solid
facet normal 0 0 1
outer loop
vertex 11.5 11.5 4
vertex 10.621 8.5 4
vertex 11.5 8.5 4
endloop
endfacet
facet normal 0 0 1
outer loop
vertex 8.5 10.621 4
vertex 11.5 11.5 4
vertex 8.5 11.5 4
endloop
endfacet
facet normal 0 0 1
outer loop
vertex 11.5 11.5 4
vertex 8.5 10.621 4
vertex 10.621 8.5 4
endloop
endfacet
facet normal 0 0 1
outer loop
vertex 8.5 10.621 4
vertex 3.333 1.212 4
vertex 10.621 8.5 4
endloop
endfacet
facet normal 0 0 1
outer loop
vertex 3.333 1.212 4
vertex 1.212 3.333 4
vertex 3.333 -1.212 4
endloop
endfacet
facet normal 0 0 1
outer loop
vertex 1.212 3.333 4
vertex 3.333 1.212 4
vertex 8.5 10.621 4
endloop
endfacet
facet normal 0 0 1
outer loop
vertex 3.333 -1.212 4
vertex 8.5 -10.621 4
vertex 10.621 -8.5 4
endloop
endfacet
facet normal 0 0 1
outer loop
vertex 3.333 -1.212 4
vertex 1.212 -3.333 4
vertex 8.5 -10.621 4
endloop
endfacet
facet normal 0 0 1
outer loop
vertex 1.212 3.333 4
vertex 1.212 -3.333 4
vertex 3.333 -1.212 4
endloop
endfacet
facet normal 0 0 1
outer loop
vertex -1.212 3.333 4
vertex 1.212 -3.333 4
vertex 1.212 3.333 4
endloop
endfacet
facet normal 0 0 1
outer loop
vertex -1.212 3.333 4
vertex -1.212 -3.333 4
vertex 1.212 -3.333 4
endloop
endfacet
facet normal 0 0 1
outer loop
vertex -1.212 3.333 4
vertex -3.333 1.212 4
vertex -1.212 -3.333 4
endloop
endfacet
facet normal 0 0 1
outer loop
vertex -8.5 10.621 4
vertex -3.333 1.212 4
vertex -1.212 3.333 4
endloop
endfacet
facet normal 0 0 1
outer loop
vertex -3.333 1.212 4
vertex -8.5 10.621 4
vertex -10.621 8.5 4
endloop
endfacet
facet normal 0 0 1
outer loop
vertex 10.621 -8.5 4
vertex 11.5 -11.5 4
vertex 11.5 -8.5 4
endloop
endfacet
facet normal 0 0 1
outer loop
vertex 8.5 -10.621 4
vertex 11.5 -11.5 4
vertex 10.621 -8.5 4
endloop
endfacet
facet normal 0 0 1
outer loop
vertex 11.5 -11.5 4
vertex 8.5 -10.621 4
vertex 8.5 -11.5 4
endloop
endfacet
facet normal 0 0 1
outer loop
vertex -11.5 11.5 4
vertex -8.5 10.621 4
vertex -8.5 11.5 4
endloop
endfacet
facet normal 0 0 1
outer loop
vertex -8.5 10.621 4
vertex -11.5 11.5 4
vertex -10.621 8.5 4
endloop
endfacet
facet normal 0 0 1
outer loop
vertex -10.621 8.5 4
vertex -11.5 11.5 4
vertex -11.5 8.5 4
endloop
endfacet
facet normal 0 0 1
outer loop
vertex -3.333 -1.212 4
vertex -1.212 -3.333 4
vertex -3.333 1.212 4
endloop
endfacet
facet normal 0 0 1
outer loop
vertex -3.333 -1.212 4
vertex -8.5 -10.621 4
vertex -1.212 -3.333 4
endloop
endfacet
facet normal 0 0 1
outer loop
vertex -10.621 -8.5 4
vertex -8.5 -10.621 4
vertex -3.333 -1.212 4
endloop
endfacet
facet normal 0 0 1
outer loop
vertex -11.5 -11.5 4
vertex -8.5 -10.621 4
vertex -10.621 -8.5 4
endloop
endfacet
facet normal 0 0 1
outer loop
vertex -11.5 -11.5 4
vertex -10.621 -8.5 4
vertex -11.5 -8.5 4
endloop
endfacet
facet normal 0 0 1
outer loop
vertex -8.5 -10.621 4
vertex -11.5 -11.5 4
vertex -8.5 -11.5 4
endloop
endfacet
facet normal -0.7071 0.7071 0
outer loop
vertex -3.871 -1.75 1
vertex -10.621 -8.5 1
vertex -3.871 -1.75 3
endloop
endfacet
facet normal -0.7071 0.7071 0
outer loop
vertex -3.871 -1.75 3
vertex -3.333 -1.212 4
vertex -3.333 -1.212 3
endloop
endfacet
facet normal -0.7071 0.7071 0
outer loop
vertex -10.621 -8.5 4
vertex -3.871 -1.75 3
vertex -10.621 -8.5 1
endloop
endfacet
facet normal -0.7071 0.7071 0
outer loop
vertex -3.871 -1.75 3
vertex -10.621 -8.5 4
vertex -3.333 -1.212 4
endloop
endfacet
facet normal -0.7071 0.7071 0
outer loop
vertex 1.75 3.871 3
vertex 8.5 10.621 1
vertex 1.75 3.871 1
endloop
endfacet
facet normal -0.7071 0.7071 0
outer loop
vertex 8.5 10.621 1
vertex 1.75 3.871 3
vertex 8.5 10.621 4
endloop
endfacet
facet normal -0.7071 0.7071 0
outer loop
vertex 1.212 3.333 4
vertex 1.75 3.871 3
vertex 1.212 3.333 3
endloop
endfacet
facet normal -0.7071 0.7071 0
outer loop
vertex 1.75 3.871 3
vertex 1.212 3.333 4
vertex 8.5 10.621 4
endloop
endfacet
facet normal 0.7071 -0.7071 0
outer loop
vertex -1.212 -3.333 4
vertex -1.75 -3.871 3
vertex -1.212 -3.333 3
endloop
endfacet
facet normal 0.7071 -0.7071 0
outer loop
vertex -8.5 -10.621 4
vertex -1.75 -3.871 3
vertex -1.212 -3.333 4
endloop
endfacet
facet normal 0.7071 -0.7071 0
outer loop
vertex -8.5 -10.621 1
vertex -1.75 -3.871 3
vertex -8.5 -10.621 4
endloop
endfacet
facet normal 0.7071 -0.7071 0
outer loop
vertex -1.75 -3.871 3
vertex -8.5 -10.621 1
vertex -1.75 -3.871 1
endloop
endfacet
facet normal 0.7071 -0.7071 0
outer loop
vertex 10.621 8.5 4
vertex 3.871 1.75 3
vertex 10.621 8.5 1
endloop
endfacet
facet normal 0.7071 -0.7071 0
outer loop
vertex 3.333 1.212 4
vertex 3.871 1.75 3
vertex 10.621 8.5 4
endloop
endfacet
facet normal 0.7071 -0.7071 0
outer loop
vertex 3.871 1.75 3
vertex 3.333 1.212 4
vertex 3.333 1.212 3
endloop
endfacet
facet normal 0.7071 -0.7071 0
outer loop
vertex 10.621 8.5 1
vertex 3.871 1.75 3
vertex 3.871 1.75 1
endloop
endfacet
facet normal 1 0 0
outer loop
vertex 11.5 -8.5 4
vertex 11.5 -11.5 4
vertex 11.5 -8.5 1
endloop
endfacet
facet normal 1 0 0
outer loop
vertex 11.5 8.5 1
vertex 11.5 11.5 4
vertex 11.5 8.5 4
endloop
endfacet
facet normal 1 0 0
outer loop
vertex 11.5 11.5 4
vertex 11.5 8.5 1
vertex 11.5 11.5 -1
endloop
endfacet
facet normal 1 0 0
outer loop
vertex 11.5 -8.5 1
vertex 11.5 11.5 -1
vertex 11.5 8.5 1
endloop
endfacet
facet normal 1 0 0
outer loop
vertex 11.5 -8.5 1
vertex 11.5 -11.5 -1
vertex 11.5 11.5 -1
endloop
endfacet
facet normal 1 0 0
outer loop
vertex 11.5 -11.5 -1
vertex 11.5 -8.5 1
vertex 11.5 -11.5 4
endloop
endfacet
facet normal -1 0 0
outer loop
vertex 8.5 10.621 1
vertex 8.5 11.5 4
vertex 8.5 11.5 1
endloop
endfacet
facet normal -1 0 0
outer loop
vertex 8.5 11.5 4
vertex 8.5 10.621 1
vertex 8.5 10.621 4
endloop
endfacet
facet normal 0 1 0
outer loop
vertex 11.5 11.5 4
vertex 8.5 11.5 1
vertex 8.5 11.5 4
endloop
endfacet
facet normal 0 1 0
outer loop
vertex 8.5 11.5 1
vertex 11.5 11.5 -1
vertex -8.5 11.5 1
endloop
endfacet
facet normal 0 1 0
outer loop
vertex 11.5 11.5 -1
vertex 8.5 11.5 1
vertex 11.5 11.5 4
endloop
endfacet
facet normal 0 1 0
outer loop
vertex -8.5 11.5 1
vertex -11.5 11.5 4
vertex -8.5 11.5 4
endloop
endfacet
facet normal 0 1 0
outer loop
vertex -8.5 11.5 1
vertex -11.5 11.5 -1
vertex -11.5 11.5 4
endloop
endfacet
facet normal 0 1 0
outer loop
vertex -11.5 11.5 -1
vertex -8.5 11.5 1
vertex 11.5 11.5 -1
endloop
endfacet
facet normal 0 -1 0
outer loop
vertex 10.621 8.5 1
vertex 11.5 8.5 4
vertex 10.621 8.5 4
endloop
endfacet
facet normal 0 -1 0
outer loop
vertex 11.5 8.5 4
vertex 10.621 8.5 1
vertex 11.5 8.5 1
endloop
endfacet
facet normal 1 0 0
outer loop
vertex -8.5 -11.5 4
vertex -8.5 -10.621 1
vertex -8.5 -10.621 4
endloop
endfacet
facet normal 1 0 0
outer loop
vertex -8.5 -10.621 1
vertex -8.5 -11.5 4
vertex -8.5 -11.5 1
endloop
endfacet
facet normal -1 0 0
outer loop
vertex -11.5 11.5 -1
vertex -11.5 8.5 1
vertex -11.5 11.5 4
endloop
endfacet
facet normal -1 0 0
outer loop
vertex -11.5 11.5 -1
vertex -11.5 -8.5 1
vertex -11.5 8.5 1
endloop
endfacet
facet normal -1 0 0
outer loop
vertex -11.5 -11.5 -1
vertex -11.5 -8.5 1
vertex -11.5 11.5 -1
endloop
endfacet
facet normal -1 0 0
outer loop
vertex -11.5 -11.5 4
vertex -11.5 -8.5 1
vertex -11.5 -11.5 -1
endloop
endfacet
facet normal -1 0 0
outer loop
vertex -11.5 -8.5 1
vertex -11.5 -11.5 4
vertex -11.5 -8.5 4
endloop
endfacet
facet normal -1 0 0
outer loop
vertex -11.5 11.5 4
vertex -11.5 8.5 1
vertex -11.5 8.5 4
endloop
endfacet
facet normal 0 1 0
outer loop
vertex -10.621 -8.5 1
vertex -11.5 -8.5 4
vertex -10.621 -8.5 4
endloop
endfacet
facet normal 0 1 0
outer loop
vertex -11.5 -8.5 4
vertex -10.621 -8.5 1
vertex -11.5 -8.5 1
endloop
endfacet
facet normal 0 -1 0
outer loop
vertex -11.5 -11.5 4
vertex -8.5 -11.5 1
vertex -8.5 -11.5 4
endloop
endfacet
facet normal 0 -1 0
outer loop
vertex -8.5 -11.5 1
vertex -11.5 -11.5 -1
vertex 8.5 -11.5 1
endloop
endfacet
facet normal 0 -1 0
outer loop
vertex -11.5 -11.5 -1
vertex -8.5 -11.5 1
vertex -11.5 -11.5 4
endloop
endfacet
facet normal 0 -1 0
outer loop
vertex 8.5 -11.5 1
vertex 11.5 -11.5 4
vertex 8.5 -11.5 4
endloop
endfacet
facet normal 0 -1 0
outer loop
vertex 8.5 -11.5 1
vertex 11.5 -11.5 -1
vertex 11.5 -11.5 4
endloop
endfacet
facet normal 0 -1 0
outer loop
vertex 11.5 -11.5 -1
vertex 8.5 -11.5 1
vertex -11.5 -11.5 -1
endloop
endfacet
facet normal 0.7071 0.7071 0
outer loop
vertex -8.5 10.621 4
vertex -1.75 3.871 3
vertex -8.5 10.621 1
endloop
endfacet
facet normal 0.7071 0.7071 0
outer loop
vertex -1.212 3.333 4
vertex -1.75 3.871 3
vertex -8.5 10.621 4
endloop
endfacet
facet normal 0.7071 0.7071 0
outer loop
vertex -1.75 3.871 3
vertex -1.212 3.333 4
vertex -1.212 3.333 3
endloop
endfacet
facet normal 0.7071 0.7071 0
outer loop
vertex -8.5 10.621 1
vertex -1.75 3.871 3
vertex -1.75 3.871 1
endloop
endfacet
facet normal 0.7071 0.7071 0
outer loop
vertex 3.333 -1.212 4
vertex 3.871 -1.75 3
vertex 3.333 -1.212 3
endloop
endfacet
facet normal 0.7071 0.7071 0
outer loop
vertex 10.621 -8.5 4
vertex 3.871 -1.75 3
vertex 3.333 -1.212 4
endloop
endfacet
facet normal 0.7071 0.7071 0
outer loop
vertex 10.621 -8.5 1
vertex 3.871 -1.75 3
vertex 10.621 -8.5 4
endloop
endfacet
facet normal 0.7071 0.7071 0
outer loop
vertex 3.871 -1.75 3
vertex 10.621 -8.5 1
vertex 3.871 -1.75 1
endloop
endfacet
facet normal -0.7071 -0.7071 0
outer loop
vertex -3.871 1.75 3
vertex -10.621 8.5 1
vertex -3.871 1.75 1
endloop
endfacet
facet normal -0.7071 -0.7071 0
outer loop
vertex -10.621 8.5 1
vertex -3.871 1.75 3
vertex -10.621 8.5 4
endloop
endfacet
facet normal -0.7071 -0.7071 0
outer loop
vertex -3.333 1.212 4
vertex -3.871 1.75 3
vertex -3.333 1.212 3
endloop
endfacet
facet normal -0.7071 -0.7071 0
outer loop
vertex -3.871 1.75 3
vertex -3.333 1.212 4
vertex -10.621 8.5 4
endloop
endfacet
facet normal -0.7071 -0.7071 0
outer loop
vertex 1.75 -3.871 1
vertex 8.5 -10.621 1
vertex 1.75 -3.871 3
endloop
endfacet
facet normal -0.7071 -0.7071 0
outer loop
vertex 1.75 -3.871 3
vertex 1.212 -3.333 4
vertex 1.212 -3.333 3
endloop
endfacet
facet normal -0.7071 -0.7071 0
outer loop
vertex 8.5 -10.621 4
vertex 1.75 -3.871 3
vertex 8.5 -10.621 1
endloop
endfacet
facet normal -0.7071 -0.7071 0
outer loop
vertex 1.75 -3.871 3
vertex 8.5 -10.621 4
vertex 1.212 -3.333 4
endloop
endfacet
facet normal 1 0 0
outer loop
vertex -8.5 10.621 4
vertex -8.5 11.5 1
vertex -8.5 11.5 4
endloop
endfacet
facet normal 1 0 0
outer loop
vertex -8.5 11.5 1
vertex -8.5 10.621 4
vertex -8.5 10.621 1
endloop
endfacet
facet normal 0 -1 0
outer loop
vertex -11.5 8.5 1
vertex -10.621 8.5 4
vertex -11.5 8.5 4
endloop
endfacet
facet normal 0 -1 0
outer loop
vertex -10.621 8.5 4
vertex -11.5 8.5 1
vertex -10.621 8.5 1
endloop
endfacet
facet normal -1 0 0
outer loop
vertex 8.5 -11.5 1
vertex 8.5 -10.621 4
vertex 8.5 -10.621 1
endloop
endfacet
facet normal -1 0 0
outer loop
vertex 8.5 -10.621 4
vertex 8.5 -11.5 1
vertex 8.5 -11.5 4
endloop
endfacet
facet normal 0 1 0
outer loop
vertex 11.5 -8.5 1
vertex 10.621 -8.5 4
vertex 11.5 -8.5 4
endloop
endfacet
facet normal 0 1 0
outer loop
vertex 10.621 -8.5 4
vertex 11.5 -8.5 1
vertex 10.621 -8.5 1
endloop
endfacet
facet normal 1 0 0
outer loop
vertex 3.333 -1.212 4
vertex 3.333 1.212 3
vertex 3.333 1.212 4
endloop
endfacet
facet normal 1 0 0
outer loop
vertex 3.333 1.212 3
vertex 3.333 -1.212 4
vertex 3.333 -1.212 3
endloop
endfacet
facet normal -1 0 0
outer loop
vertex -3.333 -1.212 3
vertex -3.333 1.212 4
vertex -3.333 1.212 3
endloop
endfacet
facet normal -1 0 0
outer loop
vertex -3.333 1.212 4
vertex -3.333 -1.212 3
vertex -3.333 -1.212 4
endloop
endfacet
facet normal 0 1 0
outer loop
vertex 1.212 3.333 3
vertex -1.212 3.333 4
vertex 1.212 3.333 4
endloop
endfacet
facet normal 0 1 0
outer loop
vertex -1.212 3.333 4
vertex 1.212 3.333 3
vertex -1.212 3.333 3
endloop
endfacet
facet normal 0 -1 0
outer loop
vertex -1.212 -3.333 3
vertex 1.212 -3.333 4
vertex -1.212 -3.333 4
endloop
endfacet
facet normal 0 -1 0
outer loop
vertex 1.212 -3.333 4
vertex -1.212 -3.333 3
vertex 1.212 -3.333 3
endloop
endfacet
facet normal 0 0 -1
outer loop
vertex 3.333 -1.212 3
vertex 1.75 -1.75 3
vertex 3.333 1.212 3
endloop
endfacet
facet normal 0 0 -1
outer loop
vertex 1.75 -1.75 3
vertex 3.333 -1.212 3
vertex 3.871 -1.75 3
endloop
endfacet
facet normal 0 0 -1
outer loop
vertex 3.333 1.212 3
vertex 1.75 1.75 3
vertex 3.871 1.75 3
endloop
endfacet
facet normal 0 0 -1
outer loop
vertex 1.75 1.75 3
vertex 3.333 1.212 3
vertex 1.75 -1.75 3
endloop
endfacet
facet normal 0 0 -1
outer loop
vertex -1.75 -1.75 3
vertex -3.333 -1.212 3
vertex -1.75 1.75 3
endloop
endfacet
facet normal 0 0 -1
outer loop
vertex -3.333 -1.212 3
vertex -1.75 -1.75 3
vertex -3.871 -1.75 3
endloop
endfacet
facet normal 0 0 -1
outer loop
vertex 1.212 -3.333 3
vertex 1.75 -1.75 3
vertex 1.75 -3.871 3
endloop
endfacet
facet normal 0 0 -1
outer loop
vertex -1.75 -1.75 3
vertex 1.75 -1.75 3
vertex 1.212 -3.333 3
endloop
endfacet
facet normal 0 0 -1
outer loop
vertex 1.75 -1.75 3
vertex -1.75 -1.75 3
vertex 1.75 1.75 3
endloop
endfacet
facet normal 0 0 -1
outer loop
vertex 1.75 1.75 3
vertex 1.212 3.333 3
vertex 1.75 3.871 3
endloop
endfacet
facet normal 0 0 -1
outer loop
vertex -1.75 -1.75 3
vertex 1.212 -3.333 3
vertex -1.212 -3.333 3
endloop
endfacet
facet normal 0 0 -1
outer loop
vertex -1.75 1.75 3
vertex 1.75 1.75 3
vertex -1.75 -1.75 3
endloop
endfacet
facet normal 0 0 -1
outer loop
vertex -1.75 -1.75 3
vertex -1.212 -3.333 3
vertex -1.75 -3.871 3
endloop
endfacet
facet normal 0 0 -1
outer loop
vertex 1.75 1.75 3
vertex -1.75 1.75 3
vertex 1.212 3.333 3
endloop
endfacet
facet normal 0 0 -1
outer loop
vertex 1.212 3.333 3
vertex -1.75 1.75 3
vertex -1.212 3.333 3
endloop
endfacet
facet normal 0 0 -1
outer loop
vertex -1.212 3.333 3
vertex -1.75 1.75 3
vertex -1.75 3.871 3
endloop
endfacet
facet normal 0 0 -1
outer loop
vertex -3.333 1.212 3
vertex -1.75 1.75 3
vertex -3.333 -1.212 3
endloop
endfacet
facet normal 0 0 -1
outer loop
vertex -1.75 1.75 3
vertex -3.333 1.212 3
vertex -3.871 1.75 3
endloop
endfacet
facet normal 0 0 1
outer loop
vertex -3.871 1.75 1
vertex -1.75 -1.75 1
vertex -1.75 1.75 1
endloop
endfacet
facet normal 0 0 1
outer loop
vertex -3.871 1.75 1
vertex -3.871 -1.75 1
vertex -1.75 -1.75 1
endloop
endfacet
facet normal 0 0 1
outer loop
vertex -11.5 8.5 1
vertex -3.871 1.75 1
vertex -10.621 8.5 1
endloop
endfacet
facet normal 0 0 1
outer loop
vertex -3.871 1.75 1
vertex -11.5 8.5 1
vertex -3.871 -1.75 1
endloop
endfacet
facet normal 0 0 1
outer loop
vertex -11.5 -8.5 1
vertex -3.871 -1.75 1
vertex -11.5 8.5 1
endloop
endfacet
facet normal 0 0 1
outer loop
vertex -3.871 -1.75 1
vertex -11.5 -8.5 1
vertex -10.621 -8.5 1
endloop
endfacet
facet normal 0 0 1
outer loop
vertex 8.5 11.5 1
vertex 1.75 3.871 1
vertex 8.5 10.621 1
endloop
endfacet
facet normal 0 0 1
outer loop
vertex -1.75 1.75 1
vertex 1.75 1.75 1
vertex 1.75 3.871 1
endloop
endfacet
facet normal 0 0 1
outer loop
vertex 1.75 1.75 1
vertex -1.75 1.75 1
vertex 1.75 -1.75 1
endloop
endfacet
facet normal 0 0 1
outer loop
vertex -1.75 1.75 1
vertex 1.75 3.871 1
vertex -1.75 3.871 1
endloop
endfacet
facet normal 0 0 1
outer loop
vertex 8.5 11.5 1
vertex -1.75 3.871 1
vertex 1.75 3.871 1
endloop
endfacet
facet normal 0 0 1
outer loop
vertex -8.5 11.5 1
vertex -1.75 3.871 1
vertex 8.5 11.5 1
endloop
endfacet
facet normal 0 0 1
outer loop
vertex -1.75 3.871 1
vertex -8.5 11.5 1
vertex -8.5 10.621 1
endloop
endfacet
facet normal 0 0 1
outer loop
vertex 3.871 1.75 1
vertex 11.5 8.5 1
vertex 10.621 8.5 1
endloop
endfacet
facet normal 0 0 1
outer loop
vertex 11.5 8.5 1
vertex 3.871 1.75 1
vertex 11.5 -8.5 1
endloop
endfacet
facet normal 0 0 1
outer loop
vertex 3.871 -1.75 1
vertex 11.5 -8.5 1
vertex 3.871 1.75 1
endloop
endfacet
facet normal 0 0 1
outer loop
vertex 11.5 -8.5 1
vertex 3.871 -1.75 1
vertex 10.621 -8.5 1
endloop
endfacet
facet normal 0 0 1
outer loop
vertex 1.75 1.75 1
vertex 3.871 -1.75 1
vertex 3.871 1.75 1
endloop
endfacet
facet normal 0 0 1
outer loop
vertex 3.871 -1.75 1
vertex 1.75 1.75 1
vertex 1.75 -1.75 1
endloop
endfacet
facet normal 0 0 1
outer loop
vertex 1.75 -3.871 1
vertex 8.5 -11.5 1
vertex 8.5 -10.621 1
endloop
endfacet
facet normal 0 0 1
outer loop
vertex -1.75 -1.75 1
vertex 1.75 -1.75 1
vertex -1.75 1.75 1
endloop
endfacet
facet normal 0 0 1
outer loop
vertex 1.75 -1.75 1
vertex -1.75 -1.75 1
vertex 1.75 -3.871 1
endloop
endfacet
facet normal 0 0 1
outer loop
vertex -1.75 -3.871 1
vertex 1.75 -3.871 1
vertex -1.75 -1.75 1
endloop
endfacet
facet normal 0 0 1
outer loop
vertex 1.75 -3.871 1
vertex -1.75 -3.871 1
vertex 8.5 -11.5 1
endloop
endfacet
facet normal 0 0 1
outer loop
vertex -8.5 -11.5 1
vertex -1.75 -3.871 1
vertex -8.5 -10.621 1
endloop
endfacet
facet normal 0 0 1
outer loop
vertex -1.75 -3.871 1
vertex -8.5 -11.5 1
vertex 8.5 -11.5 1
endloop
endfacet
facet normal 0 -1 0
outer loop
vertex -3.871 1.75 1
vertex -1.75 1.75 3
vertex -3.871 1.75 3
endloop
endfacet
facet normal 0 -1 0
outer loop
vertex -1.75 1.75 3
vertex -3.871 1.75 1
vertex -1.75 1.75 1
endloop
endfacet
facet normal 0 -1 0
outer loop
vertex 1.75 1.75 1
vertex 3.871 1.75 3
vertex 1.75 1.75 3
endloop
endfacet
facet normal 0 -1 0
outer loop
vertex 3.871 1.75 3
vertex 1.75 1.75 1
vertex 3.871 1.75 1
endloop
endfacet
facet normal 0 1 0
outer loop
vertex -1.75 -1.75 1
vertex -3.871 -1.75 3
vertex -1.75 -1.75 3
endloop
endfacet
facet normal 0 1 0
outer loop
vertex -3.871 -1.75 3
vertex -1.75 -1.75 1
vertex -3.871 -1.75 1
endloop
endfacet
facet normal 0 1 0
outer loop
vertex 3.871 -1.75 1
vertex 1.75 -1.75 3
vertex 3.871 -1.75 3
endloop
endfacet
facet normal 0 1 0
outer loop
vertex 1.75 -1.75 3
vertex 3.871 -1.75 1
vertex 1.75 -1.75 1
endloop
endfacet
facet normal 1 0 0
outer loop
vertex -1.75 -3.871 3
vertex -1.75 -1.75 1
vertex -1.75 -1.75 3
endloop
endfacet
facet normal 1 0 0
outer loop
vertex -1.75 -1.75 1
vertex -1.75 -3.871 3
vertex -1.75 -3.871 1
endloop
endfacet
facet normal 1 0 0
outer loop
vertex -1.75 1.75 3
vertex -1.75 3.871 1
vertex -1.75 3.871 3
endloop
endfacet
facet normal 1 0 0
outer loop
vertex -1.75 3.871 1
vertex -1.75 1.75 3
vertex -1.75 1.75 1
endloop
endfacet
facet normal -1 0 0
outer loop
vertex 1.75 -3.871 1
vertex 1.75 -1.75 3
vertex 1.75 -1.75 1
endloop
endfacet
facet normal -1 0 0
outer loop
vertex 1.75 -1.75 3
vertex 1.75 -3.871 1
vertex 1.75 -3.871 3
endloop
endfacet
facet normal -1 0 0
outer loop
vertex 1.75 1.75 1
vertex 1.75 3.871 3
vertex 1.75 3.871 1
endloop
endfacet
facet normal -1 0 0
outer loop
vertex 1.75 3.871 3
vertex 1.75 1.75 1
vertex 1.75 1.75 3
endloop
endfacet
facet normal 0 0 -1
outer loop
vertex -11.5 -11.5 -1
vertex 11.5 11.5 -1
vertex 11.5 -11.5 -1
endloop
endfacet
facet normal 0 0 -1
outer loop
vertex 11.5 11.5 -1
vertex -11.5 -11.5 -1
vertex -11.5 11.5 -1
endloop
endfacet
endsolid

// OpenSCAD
// GOAL: Design a parameterized zip tie anchor to be used for cable management
$fn = 128;
DEBUG_ENABLED = false;

// FEATURES:
//  1) Print with no supports (maintain <45 degree angles, or short bridges)
//  2) Standard zipties need to fit
//  3) PLA should be strong enough without having to use ABS or PETG (though I can default to that if need be)
//  4) Should take as parameters the "configuration" items, but default in the case where they are not provided or are zero
//  5) 


// CONFIGURATION NEEDS:
//  1) length/width/base height 
zip_tie_anchor_length           = 20;
zip_tie_anchor_width            = 20;
zip_tie_anchor_base_height      = 2;
zip_tie_anchor_base_edge_radius = 1;

//  2) height/width/gap of anchor "Cross" (Length is durived from base)
zip_tie_cross_height            = 4;
zip_tie_cross_width             = 3;
zip_tie_cross_gap_length        = 5;


zip_tie_anchor();

module zip_tie_anchor(length = 0 ,width = 0 ,base_height = 0 ,base_edge_radius = 0 ,cross_height = 0,cross_width = 0 ,cross_gap_length = 0 )
{
    // If the provided parameters are not present use the defaults
    l_zip_tie_anchor_length             = ( length == 0 ) ? zip_tie_anchor_length : length;
    l_zip_tie_anchor_width              = ( width == 0 ) ? zip_tie_anchor_width : width;
    l_zip_tie_anchor_base_height        = ( base_height == 0 ) ? zip_tie_anchor_base_height : base_height;
    l_zip_tie_anchor_base_edge_radius   = ( base_edge_radius == 0 ) ? zip_tie_anchor_base_edge_radius : base_edge_radius;
    l_zip_tie_cross_height              = ( cross_height == 0 ) ? zip_tie_cross_height : cross_height;
    l_zip_tie_cross_width               = ( cross_width == 0 ) ? zip_tie_cross_width : cross_width;
    l_zip_tie_cross_length              = sqrt(pow(l_zip_tie_anchor_length,2)+pow(l_zip_tie_anchor_width,2))-l_zip_tie_anchor_base_edge_radius+l_zip_tie_cross_width/2;

    // Output the config used for this ZTA if requested
    if ( DEBUG_ENABLED )
    {
        echo ( l_zip_tie_anchor_length                  = l_zip_tie_anchor_length );
        echo ( l_zip_tie_anchor_width                   = l_zip_tie_anchor_width );
        echo ( l_zip_tie_anchor_base_height             = l_zip_tie_anchor_base_height );
        echo ( l_zip_tie_cross_height                   = l_zip_tie_cross_height );
        echo ( l_zip_tie_cross_width                    = l_zip_tie_cross_width );
    }
    
    // Base
    cube([l_zip_tie_anchor_length+l_zip_tie_cross_width,l_zip_tie_anchor_width+l_zip_tie_cross_width,l_zip_tie_anchor_base_height],center = true);
    
    // Cross for ziptie
    
    difference()
    {
        // Cross
        union()
        {   
            translate([0,0,l_zip_tie_anchor_base_height])
            {
                // Main Cross/Arm
                rotate([0,0,45])
                cube([l_zip_tie_cross_length,l_zip_tie_cross_width,l_zip_tie_cross_height], center = true);
                
                // Set of 2 "filler" boxes for each corner to make the corners solid
                translate([l_zip_tie_anchor_length/2,l_zip_tie_anchor_width/2,0])
                cube([l_zip_tie_cross_width,l_zip_tie_cross_width,l_zip_tie_cross_height], center = true);
                
                translate([-l_zip_tie_anchor_length/2,-l_zip_tie_anchor_width/2,0])
                cube([l_zip_tie_cross_width,l_zip_tie_cross_width,l_zip_tie_cross_height], center = true);
            
                // Main Cross/Arm
                rotate([0,0,-45])
                cube([l_zip_tie_cross_length,l_zip_tie_cross_width,l_zip_tie_cross_height], center = true);
                
                // Set of 2 "filler" boxes for each corner to make the corners solid
                translate([-l_zip_tie_anchor_length/2,l_zip_tie_anchor_width/2,0])
                cube([l_zip_tie_cross_width,l_zip_tie_cross_width,l_zip_tie_cross_height], center = true);
                
                translate([l_zip_tie_anchor_length/2,-l_zip_tie_anchor_width/2,0])
                cube([l_zip_tie_cross_width,l_zip_tie_cross_width,l_zip_tie_cross_height], center = true);
                
                // Center Holding Box
                cube([l_zip_tie_anchor_length/3,l_zip_tie_anchor_width/3,l_zip_tie_cross_height], center = true);
                
            }
        }
        
        // Center Cutouts for zip ties
        union()
        {
            translate([0,0,l_zip_tie_anchor_base_height])
            {
                rotate([0,0,0])
                #cube([l_zip_tie_anchor_length/2,3.5,2],center = true);
        
                rotate([0,0,90])
                #cube([l_zip_tie_anchor_length/2,3.5,2],center = true);
            }
        }
        
        
    }
    
}

// Creation of a Box with X/Y/Z size, and rounded
// corners with R width
module RoundedCube(xdim ,ydim,zdim,rdim)
{
    hull()
    {
        translate([rdim,rdim,0])cylinder(h=zdim,r=rdim);
        translate([xdim-rdim,rdim,0])cylinder(h=zdim,r=rdim);
        translate([rdim,ydim-rdim,0])cylinder(h=zdim,r=rdim);
        translate([xdim-rdim,ydim-rdim,0])cylinder(h=zdim,r=rdim);
    }
}
